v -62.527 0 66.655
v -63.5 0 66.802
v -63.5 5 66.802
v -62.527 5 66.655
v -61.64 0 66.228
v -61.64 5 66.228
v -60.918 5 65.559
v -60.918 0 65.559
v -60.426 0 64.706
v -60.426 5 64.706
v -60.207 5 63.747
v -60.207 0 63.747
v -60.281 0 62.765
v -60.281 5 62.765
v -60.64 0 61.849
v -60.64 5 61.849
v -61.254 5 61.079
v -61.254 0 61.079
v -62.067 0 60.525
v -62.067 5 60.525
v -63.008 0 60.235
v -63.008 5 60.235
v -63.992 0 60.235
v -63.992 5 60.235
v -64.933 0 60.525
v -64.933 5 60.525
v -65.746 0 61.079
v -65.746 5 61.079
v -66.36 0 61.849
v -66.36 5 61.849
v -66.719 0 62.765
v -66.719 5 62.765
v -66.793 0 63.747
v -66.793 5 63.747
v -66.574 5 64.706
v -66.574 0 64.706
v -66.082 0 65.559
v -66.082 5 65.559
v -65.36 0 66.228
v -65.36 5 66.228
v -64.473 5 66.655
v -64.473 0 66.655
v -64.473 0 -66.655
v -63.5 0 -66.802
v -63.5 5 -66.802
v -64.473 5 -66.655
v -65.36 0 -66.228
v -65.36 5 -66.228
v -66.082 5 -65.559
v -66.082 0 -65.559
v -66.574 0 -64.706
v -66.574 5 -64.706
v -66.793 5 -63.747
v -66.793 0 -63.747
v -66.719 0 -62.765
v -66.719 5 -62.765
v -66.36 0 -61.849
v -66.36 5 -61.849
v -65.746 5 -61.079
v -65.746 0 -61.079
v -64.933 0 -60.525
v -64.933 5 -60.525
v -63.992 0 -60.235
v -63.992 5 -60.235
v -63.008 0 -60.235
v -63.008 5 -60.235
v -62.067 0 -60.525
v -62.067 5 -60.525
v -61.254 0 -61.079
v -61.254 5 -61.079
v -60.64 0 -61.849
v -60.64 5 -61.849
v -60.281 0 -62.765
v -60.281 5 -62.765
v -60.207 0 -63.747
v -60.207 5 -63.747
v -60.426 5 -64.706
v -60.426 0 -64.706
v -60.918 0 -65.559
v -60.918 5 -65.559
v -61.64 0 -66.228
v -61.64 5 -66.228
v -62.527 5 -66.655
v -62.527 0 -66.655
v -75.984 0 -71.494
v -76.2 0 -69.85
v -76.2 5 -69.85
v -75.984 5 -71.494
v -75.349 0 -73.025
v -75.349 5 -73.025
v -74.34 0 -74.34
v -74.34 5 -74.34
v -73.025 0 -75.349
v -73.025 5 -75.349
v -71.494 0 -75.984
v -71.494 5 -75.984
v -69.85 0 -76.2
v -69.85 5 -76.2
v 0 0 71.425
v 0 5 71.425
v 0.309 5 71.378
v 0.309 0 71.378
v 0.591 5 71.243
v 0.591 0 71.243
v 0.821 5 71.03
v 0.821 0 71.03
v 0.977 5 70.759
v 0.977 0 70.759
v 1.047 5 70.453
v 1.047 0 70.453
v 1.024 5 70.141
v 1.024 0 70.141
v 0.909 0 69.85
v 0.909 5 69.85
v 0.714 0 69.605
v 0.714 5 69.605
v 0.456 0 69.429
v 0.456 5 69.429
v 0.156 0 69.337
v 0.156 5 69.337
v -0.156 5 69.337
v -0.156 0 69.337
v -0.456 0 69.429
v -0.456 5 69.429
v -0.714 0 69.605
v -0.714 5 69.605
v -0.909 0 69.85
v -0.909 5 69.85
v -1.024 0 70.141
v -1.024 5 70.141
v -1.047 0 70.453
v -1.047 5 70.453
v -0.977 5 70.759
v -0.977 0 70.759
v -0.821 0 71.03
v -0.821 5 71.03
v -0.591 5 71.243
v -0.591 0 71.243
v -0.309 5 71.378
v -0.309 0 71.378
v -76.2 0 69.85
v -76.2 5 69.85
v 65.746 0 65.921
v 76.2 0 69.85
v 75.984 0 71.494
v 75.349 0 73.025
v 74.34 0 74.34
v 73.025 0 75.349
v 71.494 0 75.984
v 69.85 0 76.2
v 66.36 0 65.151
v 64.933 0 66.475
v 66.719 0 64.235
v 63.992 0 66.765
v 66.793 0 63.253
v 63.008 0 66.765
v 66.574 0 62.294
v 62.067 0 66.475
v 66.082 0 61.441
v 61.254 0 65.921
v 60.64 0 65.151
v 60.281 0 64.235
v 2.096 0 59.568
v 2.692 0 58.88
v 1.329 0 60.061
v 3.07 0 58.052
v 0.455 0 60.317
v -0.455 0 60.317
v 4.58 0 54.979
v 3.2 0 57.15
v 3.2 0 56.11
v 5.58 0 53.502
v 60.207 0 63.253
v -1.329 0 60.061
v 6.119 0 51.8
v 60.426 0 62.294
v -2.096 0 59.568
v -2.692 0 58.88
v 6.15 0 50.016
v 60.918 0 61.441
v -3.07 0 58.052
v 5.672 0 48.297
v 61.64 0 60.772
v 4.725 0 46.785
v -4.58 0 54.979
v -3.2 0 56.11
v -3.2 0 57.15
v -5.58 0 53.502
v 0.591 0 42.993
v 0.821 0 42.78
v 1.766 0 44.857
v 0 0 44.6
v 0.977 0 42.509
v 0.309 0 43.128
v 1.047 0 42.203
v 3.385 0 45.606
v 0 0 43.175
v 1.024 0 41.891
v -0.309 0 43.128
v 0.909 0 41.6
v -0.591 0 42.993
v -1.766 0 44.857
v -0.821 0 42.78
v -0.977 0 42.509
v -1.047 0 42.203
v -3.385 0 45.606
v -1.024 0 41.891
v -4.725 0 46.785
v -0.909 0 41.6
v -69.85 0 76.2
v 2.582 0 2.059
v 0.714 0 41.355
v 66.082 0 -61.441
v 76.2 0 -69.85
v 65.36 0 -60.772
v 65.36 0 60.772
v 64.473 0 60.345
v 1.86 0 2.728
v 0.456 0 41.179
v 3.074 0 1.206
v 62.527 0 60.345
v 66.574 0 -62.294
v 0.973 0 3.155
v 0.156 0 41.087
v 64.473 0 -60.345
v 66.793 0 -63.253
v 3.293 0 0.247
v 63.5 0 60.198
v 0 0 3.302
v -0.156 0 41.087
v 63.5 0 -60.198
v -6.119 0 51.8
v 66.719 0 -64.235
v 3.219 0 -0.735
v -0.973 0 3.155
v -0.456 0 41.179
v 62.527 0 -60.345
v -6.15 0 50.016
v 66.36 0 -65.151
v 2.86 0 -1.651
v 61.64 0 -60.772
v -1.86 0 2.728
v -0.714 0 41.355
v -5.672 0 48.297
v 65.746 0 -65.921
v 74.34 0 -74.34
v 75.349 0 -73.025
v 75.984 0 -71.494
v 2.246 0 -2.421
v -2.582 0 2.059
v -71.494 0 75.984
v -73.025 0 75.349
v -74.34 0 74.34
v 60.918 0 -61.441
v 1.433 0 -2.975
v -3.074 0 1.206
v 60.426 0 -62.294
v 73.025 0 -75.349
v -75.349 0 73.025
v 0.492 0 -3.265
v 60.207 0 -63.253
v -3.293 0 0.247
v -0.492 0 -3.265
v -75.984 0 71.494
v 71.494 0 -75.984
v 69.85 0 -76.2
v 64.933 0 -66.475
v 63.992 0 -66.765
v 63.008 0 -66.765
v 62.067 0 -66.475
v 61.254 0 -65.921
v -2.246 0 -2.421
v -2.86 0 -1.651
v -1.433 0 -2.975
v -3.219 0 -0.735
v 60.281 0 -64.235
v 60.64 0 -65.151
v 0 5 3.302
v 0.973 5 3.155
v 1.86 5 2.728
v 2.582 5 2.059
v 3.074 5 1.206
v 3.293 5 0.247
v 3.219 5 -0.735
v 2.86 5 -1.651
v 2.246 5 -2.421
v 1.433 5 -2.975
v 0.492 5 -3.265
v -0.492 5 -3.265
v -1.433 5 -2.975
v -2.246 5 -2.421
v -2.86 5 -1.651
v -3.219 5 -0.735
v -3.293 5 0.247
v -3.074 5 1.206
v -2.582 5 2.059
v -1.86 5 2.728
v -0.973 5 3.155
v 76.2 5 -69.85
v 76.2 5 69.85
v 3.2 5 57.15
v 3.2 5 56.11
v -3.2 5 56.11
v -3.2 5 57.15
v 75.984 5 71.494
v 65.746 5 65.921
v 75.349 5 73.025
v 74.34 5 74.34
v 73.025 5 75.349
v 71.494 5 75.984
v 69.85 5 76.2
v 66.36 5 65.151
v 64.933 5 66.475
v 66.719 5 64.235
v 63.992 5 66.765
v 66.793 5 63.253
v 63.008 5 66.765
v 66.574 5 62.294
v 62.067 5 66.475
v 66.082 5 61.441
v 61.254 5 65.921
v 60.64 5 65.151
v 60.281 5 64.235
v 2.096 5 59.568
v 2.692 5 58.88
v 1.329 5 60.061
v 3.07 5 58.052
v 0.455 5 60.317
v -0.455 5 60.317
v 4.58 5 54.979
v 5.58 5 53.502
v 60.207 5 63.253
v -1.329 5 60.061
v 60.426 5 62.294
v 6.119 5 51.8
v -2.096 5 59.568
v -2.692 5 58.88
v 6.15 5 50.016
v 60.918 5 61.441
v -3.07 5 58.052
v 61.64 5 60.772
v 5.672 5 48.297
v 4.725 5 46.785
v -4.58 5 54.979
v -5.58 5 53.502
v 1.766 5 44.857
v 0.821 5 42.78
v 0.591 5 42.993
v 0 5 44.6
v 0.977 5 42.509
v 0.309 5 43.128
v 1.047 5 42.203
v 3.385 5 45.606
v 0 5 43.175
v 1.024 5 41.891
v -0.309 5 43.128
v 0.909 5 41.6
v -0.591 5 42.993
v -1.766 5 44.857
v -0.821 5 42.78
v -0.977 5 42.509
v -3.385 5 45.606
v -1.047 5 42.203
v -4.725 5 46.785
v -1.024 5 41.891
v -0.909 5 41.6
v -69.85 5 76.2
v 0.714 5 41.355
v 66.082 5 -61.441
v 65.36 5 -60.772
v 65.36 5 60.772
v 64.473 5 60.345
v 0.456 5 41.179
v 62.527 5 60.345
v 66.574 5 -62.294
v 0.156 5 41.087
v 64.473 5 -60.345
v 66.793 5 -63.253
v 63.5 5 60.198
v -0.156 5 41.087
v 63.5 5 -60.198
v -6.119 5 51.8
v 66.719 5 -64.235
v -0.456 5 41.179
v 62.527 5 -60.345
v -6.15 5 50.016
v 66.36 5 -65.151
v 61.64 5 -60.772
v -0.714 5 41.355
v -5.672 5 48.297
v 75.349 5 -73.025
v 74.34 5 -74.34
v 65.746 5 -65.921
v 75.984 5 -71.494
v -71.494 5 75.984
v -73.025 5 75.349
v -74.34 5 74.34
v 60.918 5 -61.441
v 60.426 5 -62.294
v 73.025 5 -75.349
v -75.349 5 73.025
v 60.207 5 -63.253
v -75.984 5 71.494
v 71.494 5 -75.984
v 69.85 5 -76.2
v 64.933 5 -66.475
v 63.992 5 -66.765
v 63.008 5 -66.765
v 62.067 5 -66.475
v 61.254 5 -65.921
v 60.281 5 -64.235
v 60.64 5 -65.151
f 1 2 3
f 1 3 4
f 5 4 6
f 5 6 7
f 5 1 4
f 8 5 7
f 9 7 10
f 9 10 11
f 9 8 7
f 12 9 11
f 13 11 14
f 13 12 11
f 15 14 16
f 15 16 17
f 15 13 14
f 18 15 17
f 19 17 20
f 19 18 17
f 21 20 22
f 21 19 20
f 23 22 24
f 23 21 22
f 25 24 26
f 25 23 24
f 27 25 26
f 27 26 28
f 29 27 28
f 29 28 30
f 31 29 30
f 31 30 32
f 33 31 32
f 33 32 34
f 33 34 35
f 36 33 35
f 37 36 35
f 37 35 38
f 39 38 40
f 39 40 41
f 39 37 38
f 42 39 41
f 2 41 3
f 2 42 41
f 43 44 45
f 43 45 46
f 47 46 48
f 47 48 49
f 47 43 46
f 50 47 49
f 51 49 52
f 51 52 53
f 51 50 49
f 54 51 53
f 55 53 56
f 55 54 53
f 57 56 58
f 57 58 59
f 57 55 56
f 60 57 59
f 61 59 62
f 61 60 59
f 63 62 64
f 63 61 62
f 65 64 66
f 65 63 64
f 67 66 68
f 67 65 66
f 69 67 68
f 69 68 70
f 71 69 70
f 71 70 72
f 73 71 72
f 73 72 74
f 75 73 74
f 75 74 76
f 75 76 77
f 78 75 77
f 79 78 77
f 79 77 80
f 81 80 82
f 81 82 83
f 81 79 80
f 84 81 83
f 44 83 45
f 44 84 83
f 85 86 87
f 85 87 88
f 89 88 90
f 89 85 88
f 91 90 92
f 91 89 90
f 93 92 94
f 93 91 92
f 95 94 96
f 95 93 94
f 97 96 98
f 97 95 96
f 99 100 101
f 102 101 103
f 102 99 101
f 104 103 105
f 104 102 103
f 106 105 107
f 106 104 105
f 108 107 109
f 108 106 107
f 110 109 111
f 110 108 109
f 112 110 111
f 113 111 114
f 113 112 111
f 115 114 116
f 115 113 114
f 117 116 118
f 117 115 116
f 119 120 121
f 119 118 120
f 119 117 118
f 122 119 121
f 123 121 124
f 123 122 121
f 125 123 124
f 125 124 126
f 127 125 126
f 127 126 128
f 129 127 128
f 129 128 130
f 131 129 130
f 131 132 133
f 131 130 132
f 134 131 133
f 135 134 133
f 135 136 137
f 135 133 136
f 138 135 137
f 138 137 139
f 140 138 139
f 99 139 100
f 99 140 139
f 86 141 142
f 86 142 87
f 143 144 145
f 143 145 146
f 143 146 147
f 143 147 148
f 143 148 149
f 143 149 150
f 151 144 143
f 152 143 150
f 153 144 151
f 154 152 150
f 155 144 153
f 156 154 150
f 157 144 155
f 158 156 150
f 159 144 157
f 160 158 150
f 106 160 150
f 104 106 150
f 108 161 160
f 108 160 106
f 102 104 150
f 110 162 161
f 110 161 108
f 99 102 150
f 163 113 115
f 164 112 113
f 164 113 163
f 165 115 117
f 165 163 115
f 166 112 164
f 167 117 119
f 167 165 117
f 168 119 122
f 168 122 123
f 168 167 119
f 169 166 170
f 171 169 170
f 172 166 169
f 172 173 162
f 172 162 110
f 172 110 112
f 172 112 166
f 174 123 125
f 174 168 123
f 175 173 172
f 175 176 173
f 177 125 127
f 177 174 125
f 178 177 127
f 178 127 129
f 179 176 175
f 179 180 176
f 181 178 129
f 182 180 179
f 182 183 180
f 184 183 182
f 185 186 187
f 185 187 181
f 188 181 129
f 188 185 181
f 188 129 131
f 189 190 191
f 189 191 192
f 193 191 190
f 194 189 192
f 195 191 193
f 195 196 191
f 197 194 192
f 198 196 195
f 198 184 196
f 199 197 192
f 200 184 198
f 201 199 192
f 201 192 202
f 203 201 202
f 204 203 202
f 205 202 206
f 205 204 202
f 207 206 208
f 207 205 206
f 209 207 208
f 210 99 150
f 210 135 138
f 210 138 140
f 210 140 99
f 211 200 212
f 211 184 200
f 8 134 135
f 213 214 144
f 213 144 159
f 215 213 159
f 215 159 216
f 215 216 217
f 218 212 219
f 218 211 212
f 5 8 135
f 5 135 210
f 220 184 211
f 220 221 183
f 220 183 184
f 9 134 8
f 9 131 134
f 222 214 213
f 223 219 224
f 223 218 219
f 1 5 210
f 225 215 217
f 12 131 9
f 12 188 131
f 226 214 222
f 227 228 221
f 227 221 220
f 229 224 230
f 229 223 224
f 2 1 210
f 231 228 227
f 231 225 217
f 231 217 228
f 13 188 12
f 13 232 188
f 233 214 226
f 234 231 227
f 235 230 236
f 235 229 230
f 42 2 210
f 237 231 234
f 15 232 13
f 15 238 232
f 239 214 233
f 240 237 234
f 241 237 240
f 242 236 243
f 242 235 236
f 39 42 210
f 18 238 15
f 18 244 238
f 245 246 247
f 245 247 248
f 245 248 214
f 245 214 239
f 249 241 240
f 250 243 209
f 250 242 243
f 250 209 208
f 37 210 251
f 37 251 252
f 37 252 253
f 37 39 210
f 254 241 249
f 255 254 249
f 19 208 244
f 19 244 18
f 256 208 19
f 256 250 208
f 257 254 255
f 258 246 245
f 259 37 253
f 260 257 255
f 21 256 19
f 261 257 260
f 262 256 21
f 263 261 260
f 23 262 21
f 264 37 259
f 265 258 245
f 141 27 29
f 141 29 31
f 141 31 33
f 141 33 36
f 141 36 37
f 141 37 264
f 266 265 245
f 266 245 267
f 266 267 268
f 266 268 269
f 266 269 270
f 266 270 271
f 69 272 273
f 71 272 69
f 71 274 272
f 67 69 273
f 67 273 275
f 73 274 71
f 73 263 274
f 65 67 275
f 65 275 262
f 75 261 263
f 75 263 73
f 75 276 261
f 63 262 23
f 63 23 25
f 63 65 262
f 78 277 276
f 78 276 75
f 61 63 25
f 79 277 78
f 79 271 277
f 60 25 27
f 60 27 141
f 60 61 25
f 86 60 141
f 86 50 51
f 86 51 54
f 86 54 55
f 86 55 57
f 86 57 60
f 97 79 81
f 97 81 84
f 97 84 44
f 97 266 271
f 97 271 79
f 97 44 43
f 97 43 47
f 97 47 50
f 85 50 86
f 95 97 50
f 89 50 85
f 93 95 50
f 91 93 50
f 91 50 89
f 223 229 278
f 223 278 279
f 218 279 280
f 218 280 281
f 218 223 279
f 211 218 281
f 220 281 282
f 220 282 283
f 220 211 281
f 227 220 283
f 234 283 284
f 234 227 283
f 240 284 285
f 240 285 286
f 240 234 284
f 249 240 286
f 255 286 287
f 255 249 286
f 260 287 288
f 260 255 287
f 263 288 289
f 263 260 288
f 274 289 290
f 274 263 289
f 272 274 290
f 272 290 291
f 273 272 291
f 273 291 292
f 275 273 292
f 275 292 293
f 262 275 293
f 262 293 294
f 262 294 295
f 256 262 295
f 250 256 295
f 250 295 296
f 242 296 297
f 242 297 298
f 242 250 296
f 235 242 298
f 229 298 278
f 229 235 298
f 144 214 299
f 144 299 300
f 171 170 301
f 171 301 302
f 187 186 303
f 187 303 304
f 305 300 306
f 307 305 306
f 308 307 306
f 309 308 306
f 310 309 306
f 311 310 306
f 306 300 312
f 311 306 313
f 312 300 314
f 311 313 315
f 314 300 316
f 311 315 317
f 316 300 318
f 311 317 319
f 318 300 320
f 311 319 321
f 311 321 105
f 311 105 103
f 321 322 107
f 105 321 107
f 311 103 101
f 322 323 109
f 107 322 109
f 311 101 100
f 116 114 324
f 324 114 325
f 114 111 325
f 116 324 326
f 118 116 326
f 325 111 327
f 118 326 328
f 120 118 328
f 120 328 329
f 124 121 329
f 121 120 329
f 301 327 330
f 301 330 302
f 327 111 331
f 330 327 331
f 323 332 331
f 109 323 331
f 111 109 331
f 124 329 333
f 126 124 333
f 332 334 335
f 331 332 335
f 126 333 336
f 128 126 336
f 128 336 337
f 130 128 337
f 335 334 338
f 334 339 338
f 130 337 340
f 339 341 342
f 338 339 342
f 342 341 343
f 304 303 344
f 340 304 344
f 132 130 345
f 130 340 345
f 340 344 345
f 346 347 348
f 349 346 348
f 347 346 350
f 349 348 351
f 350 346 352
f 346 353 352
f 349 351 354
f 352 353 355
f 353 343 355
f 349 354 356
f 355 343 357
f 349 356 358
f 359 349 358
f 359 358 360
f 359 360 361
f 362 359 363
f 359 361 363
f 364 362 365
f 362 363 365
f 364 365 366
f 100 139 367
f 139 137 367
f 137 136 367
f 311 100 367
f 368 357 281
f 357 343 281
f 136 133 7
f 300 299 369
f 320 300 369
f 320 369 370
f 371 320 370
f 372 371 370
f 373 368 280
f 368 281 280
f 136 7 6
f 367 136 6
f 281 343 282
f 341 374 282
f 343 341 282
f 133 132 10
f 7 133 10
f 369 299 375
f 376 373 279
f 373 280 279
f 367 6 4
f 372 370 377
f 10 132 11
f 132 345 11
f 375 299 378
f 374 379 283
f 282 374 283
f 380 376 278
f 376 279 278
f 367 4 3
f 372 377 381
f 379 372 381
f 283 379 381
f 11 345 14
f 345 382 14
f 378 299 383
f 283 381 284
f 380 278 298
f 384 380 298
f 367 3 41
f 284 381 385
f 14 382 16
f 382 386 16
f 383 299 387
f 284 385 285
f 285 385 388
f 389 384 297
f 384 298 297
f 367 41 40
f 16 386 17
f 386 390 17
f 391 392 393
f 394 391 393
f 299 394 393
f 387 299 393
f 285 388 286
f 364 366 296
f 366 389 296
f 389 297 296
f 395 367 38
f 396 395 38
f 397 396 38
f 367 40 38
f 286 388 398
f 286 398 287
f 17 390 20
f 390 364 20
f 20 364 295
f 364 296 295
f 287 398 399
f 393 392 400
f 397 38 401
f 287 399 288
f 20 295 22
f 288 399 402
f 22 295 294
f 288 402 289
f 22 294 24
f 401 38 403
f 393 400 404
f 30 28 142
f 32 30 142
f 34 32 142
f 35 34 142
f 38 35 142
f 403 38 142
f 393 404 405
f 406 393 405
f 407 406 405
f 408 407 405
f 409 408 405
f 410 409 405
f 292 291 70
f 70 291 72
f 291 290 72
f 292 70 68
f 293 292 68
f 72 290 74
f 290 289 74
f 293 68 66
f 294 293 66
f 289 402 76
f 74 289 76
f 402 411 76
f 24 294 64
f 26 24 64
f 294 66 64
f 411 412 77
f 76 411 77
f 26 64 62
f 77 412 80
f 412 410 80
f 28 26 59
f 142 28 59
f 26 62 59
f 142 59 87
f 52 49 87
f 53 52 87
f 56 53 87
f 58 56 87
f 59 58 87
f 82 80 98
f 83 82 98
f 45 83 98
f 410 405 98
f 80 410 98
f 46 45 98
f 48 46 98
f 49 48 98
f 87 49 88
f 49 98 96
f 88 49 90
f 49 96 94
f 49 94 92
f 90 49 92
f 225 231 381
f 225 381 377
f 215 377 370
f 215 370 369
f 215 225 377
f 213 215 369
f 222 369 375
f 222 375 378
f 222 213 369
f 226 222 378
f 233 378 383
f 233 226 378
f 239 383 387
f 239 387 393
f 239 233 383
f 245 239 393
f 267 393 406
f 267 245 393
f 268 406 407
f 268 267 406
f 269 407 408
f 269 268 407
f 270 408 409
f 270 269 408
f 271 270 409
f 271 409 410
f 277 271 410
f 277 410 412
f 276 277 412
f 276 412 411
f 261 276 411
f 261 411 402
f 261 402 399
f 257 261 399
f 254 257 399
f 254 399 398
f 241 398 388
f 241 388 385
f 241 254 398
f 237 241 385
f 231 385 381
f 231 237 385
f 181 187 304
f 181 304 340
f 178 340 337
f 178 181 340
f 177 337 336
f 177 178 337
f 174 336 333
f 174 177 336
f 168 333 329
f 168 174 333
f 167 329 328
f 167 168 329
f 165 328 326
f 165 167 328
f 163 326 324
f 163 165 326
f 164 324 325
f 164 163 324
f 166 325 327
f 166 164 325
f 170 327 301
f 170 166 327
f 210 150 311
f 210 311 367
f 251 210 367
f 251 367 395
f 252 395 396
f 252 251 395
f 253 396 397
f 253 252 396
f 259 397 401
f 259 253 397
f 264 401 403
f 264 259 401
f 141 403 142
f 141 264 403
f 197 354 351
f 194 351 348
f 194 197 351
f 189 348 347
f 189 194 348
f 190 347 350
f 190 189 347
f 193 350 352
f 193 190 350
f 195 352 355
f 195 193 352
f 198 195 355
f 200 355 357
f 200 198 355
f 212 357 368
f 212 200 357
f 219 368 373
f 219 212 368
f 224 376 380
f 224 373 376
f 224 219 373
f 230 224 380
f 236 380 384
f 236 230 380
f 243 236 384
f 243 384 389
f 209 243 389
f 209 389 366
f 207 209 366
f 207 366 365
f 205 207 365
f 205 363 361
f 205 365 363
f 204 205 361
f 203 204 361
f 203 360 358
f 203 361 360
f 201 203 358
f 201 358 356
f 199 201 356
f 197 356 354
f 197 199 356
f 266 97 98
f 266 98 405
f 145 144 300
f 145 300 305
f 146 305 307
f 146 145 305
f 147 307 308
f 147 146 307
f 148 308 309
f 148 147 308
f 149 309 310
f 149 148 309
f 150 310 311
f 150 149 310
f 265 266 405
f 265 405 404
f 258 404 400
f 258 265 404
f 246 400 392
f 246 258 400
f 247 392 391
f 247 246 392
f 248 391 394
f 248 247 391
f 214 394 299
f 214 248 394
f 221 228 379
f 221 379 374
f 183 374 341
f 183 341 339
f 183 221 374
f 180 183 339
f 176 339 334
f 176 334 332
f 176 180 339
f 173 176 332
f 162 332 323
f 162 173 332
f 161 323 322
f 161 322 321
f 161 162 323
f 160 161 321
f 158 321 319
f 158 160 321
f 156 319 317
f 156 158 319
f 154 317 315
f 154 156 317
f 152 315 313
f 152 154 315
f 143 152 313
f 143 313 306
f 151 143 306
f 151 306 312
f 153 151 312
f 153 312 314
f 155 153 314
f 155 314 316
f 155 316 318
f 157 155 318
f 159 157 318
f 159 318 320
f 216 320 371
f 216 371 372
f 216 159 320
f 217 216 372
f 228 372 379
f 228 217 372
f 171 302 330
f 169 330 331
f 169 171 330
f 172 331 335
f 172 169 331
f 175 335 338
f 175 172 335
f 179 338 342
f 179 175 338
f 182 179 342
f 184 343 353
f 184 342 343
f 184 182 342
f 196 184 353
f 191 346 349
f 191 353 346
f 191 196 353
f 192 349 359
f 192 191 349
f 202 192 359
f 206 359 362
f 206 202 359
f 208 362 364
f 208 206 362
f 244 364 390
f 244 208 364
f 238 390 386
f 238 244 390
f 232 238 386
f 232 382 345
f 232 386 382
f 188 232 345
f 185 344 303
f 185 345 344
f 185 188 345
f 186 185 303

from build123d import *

# Parameters (mm, degrees)
SKETCH1_R           = 3.302
BOSS_EXTRUDE1_DEPTH = 5
SKETCH2_R           = 1.05
CUT_EXTRUDE2_DEPTH  = 108.879006299


with BuildPart() as part:
    # Sketch1 → Boss-Extrude1 (new body)
    with BuildSketch(Plane(origin=(0, 0, 0), x_dir=(1, 0, 0), z_dir=(0, 1, 0))):
        with BuildLine():
            Line((-69.85, 76.2), (69.85, 76.2))
            ThreePointArc((69.85, 76.2), (74.340128061, 74.340128061), (76.2, 69.85))
            Line((76.2, 69.85), (76.2, -69.85))
            ThreePointArc((76.2, -69.85), (74.340128061, -74.340128061), (69.85, -76.2))
            Line((69.85, -76.2), (-69.85, -76.2))
            ThreePointArc((-69.85, -76.2), (-74.340128061, -74.340128061), (-76.2, -69.85))
            Line((-76.2, -69.85), (-76.2, 69.85))
            ThreePointArc((-76.2, 69.85), (-74.340128061, 74.340128061), (-69.85, 76.2))
        make_face()
        with Locations(Location((63.5, 63.5, 0), (0, 0, 270))):
            Circle(SKETCH1_R, mode=Mode.SUBTRACT)
        with Locations(Location((63.5, -63.5, 0), (0, 0, 90))):
            Circle(SKETCH1_R, mode=Mode.SUBTRACT)
        with Locations(Location((-63.5, -63.5, 0), (0, 0, 270))):
            Circle(SKETCH1_R, mode=Mode.SUBTRACT)
        with Locations(Location((-63.5, 63.5, 0), (0, 0, 90))):
            Circle(SKETCH1_R, mode=Mode.SUBTRACT)
        with Locations(Location((0, 0, 0), (0, 0, 270))):
            Circle(SKETCH1_R, mode=Mode.SUBTRACT)
    extrude(amount=BOSS_EXTRUDE1_DEPTH)

    # Sketch2 → Cut-Extrude2 (cut, through all)
    with BuildSketch(Plane(origin=(0, 0, 0), x_dir=(1, 0, 0), z_dir=(0, 1, 0))):
        with Locations(Location((0, -42.125, 0), (0, 0, 270))):
            Circle(SKETCH2_R)
        with Locations(Location((0, -70.375, 0), (0, 0, 270))):
            Circle(SKETCH2_R)
        with BuildLine():
            Line((-3.2, -56.110367219), (-3.2, -57.15))
            ThreePointArc((-3.2, -57.15), (0, -60.35), (3.2, -57.15))
            Line((3.2, -57.15), (3.2, -56.110367219))
            ThreePointArc((3.2, -56.110367219), (0, -44.6), (-3.2, -56.110367219))
        make_face()
    extrude(amount=CUT_EXTRUDE2_DEPTH, mode=Mode.SUBTRACT)


solid = part.part
